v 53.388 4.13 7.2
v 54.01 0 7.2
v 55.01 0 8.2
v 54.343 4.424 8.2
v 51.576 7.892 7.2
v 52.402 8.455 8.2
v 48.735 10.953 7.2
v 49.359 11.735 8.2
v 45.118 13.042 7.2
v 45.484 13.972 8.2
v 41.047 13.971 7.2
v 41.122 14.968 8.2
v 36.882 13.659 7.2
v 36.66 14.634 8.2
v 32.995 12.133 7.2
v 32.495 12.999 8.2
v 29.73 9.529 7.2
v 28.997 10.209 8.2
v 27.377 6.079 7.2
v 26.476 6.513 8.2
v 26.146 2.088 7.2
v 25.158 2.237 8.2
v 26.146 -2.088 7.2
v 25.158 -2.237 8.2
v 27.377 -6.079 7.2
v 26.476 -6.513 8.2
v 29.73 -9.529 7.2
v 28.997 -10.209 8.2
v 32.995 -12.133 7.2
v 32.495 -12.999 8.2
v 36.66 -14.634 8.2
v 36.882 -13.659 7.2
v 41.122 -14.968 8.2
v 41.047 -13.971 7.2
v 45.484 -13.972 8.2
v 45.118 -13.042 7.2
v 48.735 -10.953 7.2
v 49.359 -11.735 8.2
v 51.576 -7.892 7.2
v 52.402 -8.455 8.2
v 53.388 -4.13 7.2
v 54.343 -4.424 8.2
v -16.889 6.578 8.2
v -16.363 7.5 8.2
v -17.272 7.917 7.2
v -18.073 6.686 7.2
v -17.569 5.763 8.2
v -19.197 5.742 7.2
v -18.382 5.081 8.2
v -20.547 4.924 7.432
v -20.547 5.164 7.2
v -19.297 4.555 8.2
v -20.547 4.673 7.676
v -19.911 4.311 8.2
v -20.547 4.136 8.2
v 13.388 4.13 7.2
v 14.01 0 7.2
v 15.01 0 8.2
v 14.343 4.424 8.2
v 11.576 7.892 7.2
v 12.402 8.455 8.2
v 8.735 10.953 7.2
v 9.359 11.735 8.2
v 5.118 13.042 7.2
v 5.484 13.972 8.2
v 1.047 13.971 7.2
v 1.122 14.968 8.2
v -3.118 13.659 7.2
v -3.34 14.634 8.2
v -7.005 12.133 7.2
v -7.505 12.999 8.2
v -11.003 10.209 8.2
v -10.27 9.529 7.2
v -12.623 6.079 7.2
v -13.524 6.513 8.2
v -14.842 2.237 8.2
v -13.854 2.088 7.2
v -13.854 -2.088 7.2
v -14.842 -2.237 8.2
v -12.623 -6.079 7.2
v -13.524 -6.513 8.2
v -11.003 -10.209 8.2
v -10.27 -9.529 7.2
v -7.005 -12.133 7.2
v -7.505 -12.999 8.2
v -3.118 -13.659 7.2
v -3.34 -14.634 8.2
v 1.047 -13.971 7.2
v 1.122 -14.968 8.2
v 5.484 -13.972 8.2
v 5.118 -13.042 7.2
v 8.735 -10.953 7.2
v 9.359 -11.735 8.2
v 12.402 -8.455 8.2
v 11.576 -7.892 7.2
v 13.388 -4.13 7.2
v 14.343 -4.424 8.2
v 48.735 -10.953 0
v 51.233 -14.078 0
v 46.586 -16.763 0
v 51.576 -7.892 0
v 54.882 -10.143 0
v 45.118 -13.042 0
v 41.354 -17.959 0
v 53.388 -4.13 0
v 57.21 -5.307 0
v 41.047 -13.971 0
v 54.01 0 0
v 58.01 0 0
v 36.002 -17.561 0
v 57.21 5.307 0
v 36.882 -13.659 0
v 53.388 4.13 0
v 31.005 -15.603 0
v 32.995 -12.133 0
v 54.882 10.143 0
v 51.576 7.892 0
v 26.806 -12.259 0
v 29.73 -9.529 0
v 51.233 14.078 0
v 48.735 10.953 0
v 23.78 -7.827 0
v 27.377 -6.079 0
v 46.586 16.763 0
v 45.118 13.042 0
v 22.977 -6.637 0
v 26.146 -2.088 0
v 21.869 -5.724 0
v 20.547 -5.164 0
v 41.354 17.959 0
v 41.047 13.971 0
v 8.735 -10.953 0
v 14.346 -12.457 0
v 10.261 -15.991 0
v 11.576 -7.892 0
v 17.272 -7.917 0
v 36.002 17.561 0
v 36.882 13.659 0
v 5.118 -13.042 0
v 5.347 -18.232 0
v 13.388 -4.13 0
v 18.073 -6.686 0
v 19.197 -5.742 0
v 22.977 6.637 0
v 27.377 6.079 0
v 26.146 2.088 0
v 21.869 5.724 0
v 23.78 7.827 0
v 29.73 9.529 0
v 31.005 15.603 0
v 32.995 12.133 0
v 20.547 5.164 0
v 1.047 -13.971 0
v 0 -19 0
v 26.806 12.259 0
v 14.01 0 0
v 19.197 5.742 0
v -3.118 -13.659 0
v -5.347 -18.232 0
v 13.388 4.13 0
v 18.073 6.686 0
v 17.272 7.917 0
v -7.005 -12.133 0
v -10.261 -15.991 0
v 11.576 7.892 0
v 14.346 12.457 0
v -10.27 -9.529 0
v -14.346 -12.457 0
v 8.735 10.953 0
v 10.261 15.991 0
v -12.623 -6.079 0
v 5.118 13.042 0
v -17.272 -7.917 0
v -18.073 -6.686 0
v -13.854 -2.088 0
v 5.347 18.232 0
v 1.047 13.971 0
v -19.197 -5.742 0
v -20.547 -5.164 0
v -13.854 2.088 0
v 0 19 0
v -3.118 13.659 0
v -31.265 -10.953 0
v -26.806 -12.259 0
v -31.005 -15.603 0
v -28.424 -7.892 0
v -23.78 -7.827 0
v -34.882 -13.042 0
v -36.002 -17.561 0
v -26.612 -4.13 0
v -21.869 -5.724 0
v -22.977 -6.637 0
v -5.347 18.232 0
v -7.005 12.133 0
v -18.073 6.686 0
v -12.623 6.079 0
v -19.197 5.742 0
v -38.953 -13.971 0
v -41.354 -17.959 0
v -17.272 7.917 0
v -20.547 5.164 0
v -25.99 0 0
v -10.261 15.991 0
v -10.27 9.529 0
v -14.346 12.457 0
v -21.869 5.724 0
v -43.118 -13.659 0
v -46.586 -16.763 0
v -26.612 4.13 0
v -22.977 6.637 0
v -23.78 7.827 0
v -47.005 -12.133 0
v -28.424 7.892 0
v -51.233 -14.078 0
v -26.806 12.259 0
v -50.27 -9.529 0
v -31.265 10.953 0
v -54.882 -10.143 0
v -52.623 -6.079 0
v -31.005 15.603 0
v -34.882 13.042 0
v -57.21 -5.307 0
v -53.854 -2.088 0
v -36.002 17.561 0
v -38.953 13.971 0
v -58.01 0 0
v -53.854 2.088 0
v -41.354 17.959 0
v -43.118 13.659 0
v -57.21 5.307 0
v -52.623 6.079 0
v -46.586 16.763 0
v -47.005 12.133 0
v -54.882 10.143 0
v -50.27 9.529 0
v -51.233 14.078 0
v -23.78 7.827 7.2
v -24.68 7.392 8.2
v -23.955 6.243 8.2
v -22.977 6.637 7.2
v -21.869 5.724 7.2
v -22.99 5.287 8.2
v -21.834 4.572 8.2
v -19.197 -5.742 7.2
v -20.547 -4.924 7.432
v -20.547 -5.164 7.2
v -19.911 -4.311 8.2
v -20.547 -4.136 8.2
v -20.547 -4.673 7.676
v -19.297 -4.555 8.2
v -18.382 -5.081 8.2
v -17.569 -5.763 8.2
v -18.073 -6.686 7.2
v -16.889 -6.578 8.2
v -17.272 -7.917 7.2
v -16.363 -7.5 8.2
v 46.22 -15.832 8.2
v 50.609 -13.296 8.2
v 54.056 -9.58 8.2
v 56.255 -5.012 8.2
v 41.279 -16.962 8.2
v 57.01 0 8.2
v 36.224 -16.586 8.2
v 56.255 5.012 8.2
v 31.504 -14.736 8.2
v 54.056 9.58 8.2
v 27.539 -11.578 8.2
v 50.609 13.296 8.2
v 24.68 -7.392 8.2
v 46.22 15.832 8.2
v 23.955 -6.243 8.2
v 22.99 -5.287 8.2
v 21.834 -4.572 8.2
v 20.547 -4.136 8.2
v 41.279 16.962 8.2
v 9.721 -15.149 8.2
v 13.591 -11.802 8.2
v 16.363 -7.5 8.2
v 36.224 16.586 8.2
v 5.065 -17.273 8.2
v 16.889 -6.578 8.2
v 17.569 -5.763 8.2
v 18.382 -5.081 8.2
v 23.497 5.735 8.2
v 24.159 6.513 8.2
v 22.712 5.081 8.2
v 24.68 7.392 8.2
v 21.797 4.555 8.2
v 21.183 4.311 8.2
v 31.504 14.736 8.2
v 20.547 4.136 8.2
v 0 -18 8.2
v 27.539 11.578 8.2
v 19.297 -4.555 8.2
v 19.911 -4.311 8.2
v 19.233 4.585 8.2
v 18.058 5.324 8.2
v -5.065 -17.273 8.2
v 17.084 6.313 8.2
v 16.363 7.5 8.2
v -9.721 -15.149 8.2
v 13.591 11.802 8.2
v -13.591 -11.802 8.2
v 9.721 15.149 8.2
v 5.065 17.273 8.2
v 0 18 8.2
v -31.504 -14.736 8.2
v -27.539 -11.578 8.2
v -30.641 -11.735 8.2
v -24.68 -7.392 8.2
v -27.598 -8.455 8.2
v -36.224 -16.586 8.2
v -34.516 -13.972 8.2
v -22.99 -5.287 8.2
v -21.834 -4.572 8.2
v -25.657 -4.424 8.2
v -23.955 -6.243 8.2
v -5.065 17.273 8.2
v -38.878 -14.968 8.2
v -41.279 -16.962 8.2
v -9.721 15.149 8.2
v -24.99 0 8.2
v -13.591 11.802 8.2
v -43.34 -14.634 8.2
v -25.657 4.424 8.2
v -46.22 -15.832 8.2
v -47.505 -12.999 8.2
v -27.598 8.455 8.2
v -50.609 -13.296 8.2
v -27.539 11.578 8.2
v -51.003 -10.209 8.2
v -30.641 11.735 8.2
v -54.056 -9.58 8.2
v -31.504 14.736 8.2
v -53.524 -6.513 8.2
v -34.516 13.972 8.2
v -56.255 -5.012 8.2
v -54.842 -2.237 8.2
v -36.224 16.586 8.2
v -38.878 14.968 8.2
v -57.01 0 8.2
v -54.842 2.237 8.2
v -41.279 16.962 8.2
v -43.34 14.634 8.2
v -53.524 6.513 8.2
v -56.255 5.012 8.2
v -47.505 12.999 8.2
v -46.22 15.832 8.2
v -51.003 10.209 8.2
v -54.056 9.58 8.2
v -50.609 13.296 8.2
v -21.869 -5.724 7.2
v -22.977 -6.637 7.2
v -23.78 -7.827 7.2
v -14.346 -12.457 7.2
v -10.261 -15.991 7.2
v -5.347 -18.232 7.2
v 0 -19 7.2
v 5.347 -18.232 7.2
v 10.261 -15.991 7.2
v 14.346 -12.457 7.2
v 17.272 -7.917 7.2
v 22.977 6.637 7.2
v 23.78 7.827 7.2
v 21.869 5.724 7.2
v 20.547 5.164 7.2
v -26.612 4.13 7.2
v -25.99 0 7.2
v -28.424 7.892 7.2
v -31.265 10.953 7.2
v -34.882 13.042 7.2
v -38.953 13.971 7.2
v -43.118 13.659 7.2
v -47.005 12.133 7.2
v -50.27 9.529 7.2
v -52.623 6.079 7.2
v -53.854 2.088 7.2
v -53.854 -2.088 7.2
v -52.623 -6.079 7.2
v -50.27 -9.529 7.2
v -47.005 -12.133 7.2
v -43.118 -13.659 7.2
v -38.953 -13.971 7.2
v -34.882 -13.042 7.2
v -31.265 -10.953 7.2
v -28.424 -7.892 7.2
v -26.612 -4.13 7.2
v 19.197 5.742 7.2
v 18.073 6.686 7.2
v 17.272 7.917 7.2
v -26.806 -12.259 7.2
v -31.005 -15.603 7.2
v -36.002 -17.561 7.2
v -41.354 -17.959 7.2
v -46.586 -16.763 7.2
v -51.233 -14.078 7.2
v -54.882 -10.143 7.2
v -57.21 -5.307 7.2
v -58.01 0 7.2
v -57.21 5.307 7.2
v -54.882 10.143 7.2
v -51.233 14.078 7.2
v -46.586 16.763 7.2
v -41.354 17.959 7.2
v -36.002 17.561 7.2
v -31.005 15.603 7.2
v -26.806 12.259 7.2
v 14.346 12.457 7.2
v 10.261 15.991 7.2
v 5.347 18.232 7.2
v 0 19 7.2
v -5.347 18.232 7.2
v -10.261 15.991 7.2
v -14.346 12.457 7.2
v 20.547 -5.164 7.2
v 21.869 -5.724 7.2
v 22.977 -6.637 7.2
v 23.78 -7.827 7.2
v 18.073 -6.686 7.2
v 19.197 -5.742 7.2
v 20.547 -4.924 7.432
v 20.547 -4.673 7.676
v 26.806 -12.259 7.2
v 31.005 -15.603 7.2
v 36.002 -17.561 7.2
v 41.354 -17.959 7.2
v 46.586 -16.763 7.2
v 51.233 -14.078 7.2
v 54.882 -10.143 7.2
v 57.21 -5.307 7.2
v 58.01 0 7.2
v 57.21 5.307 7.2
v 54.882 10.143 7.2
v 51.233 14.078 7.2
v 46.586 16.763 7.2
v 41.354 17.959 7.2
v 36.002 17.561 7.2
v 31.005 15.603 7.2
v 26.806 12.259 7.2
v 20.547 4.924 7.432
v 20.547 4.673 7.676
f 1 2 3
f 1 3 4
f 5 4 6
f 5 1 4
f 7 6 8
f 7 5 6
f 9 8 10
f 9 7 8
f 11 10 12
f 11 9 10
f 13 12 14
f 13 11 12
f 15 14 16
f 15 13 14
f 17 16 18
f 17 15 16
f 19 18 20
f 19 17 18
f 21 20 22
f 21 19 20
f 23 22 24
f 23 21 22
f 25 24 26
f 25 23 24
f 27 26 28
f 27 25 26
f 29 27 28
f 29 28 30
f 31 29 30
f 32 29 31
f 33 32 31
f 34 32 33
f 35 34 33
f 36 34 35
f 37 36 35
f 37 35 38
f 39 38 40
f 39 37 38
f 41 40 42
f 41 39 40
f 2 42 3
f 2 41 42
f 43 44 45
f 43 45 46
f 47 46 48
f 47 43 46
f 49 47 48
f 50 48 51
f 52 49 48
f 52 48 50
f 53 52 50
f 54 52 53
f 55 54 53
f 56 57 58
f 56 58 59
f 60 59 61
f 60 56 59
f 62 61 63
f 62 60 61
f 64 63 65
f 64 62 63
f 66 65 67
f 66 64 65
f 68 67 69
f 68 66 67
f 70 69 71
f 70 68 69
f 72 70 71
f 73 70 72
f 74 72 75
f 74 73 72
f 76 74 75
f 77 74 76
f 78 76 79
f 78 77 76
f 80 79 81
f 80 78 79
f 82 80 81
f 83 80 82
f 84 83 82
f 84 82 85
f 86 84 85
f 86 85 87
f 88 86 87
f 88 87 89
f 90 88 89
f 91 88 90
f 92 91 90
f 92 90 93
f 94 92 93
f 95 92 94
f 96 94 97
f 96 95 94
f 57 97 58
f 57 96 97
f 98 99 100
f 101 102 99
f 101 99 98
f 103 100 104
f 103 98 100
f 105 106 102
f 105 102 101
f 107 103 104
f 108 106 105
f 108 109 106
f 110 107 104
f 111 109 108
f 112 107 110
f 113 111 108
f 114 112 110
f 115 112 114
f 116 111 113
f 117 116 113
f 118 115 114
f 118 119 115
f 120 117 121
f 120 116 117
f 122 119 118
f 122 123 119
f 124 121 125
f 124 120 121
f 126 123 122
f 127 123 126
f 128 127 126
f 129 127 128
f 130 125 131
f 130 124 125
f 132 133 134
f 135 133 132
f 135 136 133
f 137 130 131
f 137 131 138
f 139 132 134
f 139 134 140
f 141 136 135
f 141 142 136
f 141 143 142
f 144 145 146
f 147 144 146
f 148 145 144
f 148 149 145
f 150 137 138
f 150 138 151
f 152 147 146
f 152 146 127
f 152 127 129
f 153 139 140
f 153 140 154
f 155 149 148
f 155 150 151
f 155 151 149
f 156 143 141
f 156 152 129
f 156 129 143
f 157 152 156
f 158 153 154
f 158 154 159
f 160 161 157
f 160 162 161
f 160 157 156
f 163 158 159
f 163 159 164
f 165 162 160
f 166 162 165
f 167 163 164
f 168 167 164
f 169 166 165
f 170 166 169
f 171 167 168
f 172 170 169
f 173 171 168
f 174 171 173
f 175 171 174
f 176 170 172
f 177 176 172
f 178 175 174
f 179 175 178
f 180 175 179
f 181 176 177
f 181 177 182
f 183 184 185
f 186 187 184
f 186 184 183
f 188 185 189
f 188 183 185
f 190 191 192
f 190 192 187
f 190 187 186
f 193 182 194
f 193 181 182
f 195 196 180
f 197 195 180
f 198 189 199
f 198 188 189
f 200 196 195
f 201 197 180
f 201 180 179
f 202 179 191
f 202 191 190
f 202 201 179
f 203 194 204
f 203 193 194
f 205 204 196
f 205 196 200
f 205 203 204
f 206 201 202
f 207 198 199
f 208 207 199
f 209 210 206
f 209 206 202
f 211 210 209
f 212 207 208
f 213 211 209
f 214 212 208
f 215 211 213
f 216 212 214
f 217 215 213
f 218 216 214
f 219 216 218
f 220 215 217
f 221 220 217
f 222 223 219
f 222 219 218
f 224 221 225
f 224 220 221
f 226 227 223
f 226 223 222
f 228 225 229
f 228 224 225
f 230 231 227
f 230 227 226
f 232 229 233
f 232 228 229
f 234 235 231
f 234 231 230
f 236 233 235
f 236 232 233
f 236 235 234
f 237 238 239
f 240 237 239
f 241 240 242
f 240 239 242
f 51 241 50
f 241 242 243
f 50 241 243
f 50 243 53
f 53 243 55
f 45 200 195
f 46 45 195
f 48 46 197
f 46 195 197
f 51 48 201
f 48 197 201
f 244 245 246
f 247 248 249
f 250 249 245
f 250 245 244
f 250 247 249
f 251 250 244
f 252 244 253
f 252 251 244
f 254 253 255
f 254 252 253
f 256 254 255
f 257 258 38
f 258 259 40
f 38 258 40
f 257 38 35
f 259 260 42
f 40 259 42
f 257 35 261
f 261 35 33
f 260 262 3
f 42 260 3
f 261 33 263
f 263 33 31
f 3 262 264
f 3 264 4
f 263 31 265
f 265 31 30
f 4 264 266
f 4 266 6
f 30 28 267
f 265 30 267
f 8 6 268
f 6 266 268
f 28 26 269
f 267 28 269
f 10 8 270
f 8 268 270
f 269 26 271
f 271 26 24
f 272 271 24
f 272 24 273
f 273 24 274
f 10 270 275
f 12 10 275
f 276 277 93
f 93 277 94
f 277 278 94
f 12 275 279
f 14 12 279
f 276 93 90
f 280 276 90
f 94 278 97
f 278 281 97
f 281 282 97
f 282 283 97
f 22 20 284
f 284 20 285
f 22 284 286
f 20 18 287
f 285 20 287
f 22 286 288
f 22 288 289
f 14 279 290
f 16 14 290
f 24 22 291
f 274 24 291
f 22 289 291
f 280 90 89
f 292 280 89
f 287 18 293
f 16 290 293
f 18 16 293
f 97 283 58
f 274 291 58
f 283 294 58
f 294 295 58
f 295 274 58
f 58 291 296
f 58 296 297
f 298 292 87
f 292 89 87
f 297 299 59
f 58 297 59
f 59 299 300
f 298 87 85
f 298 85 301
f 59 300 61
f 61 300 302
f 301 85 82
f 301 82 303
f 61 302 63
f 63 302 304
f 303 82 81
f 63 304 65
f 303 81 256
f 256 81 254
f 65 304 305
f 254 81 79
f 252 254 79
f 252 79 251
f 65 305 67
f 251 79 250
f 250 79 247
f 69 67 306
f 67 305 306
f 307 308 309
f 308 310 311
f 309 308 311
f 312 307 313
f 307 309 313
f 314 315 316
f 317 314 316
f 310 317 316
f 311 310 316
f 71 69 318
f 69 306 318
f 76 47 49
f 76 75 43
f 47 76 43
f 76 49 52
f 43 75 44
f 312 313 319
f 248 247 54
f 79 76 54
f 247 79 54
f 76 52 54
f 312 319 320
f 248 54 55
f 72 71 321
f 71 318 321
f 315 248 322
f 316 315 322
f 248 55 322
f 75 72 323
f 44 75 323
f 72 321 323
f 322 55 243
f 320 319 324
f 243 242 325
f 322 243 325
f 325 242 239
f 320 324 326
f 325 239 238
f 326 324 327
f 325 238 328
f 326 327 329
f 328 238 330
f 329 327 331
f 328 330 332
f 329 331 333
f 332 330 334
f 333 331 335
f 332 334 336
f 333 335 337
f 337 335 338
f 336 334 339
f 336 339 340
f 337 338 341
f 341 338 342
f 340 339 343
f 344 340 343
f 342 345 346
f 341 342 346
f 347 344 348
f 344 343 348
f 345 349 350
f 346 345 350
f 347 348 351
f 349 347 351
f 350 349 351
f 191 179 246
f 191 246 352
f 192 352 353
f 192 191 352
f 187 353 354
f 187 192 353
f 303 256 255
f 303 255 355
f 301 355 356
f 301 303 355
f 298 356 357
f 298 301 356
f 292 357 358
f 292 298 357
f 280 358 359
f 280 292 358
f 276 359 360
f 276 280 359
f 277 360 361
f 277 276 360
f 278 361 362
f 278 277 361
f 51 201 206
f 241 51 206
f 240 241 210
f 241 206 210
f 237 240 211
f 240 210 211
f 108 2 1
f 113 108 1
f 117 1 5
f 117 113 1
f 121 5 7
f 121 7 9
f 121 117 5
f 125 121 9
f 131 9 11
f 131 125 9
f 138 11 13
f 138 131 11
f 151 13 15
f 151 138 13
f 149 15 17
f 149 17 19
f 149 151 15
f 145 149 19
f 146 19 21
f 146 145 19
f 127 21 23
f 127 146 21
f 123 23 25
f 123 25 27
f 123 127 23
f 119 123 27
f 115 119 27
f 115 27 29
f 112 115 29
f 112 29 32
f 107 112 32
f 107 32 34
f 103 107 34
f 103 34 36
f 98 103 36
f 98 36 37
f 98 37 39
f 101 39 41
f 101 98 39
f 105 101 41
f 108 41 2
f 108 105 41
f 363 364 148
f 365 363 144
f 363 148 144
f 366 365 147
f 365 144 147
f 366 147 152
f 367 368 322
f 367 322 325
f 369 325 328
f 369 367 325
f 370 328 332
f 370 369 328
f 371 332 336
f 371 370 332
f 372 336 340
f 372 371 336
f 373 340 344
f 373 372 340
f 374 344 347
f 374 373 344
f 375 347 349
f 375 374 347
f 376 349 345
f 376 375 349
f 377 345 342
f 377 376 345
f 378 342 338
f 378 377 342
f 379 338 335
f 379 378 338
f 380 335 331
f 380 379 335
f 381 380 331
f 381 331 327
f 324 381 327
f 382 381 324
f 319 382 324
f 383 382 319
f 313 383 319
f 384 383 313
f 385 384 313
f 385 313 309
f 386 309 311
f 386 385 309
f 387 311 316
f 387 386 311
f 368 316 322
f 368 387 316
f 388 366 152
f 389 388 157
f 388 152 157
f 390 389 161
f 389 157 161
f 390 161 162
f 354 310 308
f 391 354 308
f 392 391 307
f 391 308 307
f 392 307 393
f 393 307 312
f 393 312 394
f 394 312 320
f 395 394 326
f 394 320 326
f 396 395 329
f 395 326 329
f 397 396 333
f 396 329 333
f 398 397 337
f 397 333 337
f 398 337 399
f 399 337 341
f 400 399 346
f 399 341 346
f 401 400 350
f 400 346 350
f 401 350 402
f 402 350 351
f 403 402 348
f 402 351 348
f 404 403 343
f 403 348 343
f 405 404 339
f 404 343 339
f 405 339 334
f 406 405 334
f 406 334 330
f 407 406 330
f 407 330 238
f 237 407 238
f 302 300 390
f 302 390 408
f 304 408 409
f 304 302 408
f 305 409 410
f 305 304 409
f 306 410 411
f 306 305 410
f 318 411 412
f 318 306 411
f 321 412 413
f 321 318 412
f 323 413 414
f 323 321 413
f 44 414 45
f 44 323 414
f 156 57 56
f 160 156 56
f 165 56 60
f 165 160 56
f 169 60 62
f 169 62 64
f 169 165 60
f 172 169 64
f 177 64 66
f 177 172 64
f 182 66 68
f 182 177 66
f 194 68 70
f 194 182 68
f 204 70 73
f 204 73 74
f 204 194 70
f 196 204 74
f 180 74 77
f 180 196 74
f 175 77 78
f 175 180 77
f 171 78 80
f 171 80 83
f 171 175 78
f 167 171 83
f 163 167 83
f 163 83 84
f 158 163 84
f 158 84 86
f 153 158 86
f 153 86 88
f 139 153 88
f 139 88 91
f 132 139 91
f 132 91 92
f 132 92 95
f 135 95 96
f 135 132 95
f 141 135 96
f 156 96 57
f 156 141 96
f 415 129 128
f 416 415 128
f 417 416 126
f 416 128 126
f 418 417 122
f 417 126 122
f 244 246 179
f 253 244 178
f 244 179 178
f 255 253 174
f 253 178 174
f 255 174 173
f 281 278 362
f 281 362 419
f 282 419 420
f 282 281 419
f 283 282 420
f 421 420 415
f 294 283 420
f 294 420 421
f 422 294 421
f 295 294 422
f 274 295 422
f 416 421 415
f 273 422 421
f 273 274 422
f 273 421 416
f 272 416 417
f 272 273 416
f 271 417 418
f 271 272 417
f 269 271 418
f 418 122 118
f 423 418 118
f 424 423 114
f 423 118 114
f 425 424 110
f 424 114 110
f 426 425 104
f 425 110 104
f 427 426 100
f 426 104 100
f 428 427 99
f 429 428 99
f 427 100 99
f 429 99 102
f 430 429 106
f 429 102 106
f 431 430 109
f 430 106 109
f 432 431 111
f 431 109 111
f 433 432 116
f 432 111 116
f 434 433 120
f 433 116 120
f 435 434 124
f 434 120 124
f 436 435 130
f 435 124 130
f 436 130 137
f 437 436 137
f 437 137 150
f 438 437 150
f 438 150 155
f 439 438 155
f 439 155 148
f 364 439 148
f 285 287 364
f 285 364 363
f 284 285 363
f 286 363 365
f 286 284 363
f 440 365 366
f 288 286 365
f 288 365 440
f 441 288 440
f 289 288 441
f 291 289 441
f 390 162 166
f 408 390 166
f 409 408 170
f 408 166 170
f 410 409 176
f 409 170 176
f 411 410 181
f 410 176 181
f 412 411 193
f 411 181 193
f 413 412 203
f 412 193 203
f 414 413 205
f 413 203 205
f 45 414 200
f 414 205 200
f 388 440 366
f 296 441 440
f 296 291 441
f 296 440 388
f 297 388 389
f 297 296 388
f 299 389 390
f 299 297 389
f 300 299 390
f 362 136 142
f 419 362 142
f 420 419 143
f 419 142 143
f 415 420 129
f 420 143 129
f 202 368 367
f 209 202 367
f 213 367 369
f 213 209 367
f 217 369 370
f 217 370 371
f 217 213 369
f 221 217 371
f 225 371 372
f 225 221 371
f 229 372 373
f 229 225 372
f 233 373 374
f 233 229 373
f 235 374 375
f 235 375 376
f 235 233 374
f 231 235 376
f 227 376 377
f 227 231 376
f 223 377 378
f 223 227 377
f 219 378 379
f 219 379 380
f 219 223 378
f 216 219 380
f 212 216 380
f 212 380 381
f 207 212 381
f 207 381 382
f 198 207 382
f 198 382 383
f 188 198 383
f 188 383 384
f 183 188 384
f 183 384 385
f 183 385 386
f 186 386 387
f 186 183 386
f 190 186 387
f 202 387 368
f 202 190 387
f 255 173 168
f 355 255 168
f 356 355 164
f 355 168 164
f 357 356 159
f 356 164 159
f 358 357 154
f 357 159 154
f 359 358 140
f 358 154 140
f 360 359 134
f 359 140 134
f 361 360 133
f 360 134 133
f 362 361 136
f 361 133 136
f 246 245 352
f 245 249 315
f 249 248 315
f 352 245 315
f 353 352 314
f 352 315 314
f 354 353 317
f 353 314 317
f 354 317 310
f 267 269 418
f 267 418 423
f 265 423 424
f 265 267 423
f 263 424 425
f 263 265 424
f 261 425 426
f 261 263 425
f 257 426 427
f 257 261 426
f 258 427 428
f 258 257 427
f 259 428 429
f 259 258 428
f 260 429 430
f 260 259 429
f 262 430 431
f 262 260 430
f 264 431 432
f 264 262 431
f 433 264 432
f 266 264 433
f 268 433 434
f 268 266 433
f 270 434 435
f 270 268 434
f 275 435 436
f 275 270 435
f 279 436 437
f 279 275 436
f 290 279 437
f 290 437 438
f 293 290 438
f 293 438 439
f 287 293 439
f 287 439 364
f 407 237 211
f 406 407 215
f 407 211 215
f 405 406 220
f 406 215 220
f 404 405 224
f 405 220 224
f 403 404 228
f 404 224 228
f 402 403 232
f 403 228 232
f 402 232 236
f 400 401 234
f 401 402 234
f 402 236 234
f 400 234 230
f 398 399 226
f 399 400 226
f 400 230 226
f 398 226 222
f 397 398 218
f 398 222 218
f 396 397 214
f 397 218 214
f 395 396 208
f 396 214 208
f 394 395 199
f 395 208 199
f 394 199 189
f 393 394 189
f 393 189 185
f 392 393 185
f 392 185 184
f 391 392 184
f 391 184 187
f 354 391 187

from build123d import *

# Parameters (mm, degrees)
F0_R        = 14.01
F1_DEPTH    = 8.2
F2_T1_DEPTH = 8.2
F3_C1_SIZE  = 1
F3_C2_SIZE  = 1
F3_C3_SIZE  = 1
F3_C4_SIZE  = 1
F3_C5_SIZE  = 1
F3_C6_SIZE  = 1
F3_C7_SIZE  = 1


# Not quite as in the source:
# - a fillet or chamfer that OpenCascade refuses, or shapes differently, is made with other operations: its cross-section is extruded or revolved along the edge and cut away or added


with BuildPart() as f1:
    # F0 (on Top) → F1 (new body)
    with BuildSketch(Plane.XY):
        with BuildLine():
            Line((-22.6979741071, -5), (-18.3303027798, -5))
            ThreePointArc((-18.3303027798, -5), (0, -19), (18.3303027798, -5))
            Line((18.3303027798, -5), (22.6979741071, -5))
            ThreePointArc((22.6979741071, -5), (58.01, 0), (22.6979741071, 5))
            Line((22.6979741071, 5), (18.3303027798, 5))
            ThreePointArc((18.3303027798, 5), (0, 19), (-18.3303027798, 5))
            Line((-18.3303027798, 5), (-22.6979741071, 5))
            ThreePointArc((-22.6979741071, 5), (-58.01, 0), (-22.6979741071, -5))
        make_face()
        with Locations((-40, 0)):
            Circle(F0_R, mode=Mode.SUBTRACT)
        Circle(F0_R, mode=Mode.SUBTRACT)
        with Locations((40, 0)):
            Circle(F0_R, mode=Mode.SUBTRACT)
    extrude(amount=F1_DEPTH)

    # F2: fillet of radius 5 on 8 edges, made by hand

    # F2_s2 → F2_t1 (join)
    with BuildSketch(Plane.XY):
        with BuildLine():
            ThreePointArc((-19.2765808806, -5), (-21.9350728052, -5.7653311007), (-23.7797141095, -7.8270317253))
            ThreePointArc((-23.7797141095, -7.8270317253), (-23.1793468046, -6.4362820074), (-22.6979741071, -5))
            Line((-22.6979741071, -5), (-19.2765808806, -5))
        make_face()
        with BuildLine():
            ThreePointArc((-21.8174242293, -5), (-19.1171156049, -5.7918729423), (-17.2721275148, -7.9166666667))
            ThreePointArc((-17.2721275148, -7.9166666667), (-17.8608509549, -6.4799693801), (-18.3303027798, -5))
            Line((-18.3303027798, -5), (-21.8174242293, -5))
        make_face()
        with BuildLine():
            ThreePointArc((17.2721275148, -7.9166666667), (19.1171156049, -5.7918729423), (21.8174242293, -5))
            Line((21.8174242293, -5), (18.3303027798, -5))
            ThreePointArc((18.3303027798, -5), (17.8608509549, -6.4799693801), (17.2721275148, -7.9166666667))
        make_face()
        with BuildLine():
            ThreePointArc((19.2765808806, -5), (21.9350728052, -5.7653311007), (23.7797141095, -7.8270317253))
            ThreePointArc((23.7797141095, -7.8270317253), (23.1793468046, -6.4362820074), (22.6979741071, -5))
            Line((22.6979741071, -5), (19.2765808806, -5))
        make_face()
        with BuildLine():
            ThreePointArc((21.8174242293, 5), (19.1171156049, 5.7918729423), (17.2721275148, 7.9166666667))
            ThreePointArc((17.2721275148, 7.9166666667), (17.8608509549, 6.4799693801), (18.3303027798, 5))
            Line((18.3303027798, 5), (21.8174242293, 5))
        make_face()
        with BuildLine():
            ThreePointArc((23.7797141095, 7.8270317253), (21.9350728052, 5.7653311007), (19.2765808806, 5))
            Line((19.2765808806, 5), (22.6979741071, 5))
            ThreePointArc((22.6979741071, 5), (23.1793468046, 6.4362820074), (23.7797141095, 7.8270317253))
        make_face()
        with BuildLine():
            ThreePointArc((-17.2721275148, 7.9166666667), (-19.1171156049, 5.7918729423), (-21.8174242293, 5))
            Line((-21.8174242293, 5), (-18.3303027798, 5))
            ThreePointArc((-18.3303027798, 5), (-17.8608509549, 6.4799693801), (-17.2721275148, 7.9166666667))
        make_face()
        with BuildLine():
            ThreePointArc((-19.2765808806, 5), (-21.9350728052, 5.7653311007), (-23.7797141095, 7.8270317253))
            ThreePointArc((-23.7797141095, 7.8270317253), (-23.1793468046, 6.4362820074), (-22.6979741071, 5))
            Line((-22.6979741071, 5), (-19.2765808806, 5))
        make_face()
    extrude(amount=F2_T1_DEPTH)

    # F3: chamfer of 1 on 15 edges, made by hand

    # F3_c1
    f3_c1_edges = [f1.edges().sort_by_distance(p)[0] for p in [
        (0, -19, 8.2),
        (18.6003113726, -6.1724440085, 8.2),
        (-18.6003113726, -6.1724440085, 8.2),
    ]]
    chamfer(f3_c1_edges, length=F3_C1_SIZE)

    # F3_c2
    f3_c2_edges = [f1.edges().sort_by_distance(p)[0] for p in [
        (22.4556214842, -6.1407642155, 8.2),
        (58.01, 0, 8.2),
        (22.4556214842, 6.1407642155, 8.2),
    ]]
    chamfer(f3_c2_edges, length=F3_C2_SIZE)

    # F3_c3
    f3_c3_edges = [f1.edges().sort_by_distance(p)[0] for p in [
        (18.6003113726, 6.1724440085, 8.2),
        (0, 19, 8.2),
        (-18.6003113726, 6.1724440085, 8.2),
    ]]
    chamfer(f3_c3_edges, length=F3_C3_SIZE)

    # F3_c4
    f3_c4_edges = [f1.edges().sort_by_distance(p)[0] for p in [
        (-22.4556214842, 6.1407642155, 8.2),
        (-58.01, 0, 8.2),
        (-22.4556214842, -6.1407642155, 8.2),
    ]]
    chamfer(f3_c4_edges, length=F3_C4_SIZE)

    # F3_c5
    f3_c5_edges = [f1.edges().sort_by_distance(p)[0] for p in [
        (-54.01, 0, 8.2),
    ]]
    chamfer(f3_c5_edges, length=F3_C5_SIZE)

    # F3_c6
    f3_c6_edges = [f1.edges().sort_by_distance(p)[0] for p in [
        (-14.01, 0, 8.2),
    ]]
    chamfer(f3_c6_edges, length=F3_C6_SIZE)

    # F3_c7
    f3_c7_edges = [f1.edges().sort_by_distance(p)[0] for p in [
        (25.99, 0, 8.2),
    ]]
    chamfer(f3_c7_edges, length=F3_C7_SIZE)


solid = f1.part
